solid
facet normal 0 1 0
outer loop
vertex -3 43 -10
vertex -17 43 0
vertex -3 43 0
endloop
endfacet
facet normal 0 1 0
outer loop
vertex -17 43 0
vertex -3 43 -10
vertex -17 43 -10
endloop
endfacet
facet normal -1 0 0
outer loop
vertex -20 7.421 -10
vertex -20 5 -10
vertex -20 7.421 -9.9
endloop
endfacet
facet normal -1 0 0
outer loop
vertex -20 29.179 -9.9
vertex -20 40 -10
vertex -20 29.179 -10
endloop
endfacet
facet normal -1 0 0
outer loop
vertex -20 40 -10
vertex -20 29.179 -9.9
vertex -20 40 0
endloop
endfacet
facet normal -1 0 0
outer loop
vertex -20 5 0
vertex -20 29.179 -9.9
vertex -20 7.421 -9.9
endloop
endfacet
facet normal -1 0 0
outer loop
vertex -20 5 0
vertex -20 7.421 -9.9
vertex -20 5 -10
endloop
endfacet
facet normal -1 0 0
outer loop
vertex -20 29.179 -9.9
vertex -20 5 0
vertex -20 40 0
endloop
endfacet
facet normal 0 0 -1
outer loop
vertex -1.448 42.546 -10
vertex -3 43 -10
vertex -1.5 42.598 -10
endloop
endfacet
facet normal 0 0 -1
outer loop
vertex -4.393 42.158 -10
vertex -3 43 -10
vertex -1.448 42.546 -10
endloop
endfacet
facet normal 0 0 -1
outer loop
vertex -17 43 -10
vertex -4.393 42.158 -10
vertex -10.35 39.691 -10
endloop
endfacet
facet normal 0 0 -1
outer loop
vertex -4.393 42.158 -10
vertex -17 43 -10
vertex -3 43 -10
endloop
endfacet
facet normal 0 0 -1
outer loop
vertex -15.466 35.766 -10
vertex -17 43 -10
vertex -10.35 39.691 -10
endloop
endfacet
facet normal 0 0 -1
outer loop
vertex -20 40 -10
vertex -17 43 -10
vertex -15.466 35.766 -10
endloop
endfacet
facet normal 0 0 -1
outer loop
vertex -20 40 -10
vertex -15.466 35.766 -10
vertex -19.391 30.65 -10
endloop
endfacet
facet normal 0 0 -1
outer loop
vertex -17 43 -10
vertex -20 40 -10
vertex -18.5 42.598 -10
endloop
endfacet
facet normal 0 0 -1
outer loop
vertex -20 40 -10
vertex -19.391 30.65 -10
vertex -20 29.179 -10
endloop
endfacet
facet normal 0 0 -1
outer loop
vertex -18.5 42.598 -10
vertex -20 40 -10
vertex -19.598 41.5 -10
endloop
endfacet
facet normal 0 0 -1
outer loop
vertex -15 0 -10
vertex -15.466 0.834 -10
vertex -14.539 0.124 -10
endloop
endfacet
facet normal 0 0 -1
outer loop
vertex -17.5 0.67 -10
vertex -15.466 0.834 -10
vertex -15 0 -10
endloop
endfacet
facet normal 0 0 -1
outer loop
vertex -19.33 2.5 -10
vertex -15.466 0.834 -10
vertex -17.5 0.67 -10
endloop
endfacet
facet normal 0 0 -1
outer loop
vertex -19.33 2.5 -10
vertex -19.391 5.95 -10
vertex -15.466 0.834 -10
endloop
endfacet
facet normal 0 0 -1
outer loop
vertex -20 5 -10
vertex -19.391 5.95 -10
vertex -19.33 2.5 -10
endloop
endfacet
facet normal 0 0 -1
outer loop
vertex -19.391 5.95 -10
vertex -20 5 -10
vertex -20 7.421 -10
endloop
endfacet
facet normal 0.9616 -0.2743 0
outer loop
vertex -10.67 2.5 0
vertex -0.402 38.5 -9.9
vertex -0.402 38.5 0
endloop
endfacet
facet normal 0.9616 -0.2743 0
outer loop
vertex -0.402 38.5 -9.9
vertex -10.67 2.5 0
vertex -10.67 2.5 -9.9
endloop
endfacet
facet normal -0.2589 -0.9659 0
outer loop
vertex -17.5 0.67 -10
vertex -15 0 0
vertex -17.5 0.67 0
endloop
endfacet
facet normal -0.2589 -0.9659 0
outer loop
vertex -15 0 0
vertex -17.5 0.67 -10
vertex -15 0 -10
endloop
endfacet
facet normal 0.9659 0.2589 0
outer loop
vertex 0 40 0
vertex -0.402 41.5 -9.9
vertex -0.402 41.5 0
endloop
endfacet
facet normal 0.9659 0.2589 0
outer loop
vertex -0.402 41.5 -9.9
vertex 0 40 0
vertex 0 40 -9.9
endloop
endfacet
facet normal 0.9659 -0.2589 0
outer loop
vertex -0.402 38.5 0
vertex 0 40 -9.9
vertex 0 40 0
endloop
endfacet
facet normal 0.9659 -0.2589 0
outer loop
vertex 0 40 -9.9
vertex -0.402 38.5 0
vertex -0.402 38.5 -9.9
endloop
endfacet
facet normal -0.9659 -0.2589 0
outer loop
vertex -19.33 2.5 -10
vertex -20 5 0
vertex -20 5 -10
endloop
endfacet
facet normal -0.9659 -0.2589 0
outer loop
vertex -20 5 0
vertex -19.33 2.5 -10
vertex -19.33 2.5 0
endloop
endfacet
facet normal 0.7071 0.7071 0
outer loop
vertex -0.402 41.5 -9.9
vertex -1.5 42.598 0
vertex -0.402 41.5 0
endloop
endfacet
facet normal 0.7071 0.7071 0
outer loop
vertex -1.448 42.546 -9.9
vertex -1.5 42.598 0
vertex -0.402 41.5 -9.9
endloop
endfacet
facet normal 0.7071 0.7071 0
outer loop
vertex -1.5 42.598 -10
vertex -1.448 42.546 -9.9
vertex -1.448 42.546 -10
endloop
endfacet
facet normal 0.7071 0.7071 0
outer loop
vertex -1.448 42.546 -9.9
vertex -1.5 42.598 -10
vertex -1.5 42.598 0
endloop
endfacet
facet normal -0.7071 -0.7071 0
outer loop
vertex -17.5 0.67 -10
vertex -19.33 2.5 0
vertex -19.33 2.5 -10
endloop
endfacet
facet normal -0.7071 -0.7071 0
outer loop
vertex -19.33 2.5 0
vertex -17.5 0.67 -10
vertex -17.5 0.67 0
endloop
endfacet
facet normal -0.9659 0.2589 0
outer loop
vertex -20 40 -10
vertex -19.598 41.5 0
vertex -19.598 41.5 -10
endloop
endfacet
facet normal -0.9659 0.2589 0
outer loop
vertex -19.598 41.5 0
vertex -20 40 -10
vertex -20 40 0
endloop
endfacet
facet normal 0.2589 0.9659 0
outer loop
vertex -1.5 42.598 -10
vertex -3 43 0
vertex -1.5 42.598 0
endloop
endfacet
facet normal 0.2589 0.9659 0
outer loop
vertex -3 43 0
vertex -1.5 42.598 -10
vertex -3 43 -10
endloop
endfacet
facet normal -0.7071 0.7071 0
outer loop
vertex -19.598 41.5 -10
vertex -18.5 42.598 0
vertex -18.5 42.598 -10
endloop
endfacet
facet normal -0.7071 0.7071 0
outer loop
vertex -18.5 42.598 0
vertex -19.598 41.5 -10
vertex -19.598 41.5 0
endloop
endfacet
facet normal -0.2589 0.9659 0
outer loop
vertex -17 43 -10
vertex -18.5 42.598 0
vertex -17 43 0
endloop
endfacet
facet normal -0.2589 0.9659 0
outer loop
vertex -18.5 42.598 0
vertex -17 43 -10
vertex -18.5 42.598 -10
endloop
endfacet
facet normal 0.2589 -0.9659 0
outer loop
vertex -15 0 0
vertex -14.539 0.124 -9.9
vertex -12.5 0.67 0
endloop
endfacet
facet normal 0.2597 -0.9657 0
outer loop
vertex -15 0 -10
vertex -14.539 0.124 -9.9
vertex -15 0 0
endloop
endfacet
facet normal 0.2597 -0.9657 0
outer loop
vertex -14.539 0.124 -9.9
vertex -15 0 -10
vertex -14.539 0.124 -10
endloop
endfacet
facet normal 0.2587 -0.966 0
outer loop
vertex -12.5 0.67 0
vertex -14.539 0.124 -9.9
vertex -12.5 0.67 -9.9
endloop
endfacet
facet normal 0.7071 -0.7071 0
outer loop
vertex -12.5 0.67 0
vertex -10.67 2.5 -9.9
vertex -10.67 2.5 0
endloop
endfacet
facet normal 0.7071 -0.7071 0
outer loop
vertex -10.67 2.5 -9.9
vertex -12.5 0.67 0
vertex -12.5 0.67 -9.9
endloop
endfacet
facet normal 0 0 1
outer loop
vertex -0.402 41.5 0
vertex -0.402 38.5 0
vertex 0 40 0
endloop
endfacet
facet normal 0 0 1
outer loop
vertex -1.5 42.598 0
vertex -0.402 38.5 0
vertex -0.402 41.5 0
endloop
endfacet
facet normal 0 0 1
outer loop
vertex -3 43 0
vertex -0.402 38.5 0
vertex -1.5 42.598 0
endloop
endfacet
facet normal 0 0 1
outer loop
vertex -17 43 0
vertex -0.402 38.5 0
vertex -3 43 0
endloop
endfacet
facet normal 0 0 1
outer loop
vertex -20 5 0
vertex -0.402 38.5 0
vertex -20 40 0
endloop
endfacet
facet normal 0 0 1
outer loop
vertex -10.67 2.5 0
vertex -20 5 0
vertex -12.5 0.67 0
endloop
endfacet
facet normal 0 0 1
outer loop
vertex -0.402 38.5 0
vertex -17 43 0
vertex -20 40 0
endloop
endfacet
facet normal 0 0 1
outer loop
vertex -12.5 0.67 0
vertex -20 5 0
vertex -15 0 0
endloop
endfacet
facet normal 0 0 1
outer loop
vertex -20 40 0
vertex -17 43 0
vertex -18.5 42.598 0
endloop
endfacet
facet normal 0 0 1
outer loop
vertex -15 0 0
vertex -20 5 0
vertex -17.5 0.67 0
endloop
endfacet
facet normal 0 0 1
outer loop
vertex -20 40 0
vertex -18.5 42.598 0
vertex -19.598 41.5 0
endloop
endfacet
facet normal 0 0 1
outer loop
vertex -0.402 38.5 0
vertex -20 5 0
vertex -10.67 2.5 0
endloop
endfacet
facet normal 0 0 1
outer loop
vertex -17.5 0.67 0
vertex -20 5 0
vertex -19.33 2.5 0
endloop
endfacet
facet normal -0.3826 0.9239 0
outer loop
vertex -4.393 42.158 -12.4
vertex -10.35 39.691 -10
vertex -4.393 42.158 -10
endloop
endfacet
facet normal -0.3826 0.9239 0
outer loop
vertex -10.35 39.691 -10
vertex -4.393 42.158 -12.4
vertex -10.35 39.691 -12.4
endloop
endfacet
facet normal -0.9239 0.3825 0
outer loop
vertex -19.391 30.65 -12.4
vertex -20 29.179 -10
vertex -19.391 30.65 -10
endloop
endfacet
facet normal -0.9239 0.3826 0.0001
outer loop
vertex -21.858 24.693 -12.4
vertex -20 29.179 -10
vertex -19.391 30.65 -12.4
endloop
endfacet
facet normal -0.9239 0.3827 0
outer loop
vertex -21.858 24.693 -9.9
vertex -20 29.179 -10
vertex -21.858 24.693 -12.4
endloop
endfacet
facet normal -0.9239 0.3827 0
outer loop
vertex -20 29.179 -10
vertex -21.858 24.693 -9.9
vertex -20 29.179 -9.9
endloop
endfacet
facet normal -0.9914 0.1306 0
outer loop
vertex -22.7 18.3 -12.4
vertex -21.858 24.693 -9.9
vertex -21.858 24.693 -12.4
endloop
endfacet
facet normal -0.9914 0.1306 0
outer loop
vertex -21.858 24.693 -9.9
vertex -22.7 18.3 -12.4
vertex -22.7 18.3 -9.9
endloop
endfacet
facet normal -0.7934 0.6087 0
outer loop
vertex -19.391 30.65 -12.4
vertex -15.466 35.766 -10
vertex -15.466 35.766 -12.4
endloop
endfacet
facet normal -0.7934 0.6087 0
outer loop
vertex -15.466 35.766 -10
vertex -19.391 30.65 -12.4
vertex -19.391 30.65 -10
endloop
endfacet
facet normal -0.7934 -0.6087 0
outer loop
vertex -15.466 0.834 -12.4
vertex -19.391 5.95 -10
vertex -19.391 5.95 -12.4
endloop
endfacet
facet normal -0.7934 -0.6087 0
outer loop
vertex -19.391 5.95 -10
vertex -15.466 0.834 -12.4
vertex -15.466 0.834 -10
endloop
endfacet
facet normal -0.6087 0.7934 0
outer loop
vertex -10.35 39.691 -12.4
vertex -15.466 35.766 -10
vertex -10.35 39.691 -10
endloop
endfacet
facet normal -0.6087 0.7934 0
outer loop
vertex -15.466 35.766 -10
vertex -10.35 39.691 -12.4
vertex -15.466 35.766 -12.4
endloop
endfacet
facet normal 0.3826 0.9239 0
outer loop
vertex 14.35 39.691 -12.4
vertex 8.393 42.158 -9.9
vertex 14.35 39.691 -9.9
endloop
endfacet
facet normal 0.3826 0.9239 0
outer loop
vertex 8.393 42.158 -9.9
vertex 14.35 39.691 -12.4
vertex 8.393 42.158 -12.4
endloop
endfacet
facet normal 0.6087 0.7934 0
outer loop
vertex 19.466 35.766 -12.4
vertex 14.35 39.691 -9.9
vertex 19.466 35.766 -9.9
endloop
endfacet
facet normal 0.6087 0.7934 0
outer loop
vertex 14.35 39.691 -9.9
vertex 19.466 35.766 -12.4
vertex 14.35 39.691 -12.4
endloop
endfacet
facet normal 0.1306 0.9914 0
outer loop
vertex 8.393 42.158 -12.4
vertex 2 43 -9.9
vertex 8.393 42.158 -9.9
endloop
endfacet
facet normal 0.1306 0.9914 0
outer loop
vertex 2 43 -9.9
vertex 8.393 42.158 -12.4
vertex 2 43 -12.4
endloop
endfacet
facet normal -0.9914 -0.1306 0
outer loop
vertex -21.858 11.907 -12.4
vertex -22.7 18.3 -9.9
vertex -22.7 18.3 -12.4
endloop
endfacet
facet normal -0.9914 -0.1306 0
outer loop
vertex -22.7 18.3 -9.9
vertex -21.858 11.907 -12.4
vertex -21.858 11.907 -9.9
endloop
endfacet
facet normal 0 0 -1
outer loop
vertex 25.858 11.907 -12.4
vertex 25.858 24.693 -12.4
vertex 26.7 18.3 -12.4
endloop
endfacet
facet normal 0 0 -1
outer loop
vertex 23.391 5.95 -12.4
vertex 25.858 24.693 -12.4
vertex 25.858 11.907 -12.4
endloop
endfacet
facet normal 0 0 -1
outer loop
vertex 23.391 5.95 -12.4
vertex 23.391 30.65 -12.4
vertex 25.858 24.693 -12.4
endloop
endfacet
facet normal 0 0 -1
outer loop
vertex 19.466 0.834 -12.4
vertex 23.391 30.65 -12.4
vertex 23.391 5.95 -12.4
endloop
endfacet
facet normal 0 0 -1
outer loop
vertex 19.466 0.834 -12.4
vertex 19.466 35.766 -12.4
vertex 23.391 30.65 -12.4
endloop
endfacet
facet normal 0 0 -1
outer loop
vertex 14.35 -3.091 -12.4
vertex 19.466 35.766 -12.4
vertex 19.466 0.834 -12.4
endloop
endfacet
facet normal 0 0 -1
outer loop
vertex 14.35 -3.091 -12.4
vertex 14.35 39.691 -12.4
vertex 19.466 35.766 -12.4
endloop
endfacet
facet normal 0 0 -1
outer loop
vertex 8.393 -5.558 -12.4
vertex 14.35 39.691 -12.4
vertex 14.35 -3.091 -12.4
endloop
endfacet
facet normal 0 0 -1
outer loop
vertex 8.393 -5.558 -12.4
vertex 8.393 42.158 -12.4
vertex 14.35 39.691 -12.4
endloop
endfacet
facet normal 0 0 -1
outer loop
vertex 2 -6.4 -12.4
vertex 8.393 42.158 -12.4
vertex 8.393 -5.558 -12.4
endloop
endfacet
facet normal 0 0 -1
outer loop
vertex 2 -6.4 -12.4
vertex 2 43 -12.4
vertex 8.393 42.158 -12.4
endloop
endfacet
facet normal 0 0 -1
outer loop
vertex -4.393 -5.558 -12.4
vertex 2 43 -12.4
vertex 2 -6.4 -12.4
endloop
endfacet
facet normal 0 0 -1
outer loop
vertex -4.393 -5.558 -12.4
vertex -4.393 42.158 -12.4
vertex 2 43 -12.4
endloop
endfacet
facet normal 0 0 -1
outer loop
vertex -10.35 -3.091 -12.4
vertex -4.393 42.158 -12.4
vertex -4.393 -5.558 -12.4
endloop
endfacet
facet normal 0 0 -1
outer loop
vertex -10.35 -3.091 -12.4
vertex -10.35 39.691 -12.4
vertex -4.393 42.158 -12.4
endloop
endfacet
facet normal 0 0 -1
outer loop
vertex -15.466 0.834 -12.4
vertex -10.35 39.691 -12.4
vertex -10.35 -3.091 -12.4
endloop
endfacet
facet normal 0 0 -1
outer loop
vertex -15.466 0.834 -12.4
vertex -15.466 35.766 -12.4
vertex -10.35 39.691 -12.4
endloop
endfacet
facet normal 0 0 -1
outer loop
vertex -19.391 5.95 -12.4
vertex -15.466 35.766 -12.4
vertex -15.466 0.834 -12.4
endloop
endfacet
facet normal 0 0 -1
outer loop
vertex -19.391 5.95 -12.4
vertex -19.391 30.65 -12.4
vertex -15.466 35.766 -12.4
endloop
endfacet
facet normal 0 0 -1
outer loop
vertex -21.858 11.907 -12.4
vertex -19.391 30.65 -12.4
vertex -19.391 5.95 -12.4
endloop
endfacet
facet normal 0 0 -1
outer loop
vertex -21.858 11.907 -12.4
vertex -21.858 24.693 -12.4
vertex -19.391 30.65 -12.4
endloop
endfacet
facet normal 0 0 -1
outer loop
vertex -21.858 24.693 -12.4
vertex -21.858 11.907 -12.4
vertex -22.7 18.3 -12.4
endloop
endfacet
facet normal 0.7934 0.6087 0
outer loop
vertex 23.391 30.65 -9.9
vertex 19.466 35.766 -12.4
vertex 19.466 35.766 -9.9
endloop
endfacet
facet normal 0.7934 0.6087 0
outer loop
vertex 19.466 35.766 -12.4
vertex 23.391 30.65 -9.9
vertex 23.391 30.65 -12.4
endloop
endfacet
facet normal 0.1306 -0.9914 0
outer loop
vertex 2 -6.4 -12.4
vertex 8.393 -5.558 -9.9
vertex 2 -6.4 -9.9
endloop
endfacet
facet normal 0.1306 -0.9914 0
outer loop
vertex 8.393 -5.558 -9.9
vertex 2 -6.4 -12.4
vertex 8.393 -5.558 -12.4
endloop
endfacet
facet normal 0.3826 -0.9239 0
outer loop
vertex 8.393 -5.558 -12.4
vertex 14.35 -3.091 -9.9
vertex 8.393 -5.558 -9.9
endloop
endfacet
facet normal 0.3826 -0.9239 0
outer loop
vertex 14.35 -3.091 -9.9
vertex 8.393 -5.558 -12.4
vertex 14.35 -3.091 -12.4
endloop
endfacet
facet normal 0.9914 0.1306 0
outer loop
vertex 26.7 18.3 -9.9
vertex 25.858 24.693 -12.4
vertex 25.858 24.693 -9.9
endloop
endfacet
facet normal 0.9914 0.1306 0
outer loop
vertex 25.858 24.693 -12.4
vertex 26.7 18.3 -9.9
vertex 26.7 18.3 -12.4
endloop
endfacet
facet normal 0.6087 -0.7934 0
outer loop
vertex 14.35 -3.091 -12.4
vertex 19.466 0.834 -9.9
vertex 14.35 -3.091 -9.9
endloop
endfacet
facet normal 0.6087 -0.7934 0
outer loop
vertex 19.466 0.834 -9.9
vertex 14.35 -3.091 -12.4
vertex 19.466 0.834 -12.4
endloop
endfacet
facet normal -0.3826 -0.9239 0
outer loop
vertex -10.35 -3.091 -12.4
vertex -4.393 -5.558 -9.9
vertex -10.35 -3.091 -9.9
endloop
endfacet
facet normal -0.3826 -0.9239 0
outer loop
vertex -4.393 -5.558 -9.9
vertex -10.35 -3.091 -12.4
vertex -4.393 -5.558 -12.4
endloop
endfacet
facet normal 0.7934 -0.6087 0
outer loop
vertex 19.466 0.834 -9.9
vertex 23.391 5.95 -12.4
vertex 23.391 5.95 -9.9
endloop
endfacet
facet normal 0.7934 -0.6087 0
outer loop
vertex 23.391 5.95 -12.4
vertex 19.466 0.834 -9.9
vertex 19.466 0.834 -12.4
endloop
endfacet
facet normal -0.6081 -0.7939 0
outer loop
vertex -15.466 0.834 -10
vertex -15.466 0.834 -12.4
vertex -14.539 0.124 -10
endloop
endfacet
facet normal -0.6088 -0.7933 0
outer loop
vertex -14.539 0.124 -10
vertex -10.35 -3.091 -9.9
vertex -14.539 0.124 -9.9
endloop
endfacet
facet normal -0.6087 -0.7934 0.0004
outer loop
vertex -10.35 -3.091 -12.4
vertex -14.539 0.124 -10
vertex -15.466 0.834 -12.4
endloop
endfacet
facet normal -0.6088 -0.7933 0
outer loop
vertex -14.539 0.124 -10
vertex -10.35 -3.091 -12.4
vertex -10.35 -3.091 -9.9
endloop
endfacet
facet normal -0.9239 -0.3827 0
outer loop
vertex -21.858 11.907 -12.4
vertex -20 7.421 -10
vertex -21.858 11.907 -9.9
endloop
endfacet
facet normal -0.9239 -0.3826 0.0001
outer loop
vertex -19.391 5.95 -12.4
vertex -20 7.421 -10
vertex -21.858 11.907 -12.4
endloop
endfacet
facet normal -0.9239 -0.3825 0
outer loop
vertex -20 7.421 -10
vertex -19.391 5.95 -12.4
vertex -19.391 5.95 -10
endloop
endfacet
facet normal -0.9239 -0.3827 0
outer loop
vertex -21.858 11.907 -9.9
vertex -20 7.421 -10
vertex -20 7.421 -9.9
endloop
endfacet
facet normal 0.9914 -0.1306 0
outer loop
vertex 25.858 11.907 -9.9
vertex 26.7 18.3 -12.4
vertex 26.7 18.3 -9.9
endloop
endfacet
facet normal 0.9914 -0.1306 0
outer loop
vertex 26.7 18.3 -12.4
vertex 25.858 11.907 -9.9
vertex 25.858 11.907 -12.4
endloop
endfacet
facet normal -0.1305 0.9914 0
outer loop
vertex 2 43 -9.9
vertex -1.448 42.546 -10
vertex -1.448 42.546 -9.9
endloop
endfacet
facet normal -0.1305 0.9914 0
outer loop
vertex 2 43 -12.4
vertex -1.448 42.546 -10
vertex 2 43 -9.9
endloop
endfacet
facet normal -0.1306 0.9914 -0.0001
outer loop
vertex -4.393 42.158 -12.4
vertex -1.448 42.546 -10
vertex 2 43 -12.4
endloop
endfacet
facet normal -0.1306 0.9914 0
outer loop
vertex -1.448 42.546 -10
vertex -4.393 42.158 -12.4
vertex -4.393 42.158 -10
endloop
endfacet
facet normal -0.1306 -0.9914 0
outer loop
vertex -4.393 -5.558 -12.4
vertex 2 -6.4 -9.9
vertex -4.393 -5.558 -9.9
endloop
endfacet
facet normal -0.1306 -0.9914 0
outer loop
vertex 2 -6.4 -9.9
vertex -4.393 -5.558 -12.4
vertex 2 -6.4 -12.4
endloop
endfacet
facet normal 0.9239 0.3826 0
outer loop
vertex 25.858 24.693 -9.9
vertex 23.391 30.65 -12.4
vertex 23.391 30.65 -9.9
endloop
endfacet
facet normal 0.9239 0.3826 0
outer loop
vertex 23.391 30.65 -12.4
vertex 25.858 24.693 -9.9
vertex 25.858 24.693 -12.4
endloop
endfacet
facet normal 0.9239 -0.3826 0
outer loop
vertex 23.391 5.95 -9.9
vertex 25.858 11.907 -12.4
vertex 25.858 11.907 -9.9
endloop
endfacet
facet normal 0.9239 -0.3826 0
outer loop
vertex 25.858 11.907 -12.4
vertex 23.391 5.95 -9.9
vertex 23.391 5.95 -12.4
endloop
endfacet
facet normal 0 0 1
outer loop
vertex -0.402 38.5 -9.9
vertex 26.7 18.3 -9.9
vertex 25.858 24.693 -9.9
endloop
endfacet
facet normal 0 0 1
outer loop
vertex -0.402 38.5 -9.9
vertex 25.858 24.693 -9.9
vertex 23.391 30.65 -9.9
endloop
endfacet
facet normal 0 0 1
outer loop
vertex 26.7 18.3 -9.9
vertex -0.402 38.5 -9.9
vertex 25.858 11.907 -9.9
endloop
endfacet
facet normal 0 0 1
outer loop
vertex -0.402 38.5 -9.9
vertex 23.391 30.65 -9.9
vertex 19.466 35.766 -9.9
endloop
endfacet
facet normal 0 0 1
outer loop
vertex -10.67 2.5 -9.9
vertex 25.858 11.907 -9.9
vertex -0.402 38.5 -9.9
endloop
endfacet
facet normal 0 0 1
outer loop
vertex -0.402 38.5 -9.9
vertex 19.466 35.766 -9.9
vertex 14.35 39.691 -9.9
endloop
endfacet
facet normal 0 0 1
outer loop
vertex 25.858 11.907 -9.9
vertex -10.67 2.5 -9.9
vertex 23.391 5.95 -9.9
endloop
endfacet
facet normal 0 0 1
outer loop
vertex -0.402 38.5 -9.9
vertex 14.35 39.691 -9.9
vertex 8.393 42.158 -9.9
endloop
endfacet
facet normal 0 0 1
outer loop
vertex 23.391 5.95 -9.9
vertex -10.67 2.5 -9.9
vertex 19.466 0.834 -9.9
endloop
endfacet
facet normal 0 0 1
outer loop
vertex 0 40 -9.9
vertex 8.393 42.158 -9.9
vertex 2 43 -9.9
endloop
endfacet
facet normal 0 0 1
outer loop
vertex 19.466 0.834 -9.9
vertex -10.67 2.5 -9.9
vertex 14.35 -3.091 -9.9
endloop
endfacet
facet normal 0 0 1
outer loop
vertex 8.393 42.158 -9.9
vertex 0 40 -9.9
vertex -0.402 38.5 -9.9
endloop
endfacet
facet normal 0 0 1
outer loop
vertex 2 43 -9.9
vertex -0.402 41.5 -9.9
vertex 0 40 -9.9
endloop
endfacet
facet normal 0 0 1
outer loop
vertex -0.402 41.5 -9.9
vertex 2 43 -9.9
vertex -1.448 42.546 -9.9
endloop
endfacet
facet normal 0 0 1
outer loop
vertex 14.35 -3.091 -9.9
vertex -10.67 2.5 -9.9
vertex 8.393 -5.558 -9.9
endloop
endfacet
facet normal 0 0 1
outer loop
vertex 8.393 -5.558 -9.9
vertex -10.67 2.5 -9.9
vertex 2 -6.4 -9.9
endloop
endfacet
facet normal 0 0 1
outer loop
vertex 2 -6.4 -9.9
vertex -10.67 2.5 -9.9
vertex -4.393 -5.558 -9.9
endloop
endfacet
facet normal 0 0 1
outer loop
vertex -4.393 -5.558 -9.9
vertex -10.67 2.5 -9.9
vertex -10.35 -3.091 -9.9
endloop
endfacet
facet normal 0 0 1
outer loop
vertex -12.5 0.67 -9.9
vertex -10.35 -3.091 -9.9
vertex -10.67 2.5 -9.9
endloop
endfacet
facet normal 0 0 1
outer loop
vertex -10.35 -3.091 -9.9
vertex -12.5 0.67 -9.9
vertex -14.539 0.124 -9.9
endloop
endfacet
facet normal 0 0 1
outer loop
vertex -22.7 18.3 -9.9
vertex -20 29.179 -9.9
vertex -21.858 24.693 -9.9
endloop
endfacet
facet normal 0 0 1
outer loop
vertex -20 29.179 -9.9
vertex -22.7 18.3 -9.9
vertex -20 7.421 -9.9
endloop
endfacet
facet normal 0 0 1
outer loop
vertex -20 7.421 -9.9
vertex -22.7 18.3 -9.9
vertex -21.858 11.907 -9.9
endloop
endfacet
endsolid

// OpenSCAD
//
// A compass base for 2019 BMW X3
//

// It's not possible to locate a compass on the dash because of the
// interference with car systems. The only good place is on the door.

z_base = 10.0;
r_base = 49.4/2;

module main_body () {
    hull () {
        // Outboard corners
        translate([3.0, 40.0, 0])
            cylinder(z_base, r=3.0, $fn=12);
        translate([20.0-3.0, 40.0, 0])
            cylinder(z_base, r=3.0, $fn=12);

        // Inboard - we just use one cylinder.
        translate([20.0-5.0, 5.0, 0])
            cylinder(z_base, r=5.0, $fn=12);
    }

    // The platform - fortunately it's simply round.
    translate([-2.0, 43.0 - r_base, z_base - 0.1])
        cylinder(2.5, r=r_base, $fn=24);
}

module main () {
    rotate(180, [0,1,0]) main_body();
}

main();
